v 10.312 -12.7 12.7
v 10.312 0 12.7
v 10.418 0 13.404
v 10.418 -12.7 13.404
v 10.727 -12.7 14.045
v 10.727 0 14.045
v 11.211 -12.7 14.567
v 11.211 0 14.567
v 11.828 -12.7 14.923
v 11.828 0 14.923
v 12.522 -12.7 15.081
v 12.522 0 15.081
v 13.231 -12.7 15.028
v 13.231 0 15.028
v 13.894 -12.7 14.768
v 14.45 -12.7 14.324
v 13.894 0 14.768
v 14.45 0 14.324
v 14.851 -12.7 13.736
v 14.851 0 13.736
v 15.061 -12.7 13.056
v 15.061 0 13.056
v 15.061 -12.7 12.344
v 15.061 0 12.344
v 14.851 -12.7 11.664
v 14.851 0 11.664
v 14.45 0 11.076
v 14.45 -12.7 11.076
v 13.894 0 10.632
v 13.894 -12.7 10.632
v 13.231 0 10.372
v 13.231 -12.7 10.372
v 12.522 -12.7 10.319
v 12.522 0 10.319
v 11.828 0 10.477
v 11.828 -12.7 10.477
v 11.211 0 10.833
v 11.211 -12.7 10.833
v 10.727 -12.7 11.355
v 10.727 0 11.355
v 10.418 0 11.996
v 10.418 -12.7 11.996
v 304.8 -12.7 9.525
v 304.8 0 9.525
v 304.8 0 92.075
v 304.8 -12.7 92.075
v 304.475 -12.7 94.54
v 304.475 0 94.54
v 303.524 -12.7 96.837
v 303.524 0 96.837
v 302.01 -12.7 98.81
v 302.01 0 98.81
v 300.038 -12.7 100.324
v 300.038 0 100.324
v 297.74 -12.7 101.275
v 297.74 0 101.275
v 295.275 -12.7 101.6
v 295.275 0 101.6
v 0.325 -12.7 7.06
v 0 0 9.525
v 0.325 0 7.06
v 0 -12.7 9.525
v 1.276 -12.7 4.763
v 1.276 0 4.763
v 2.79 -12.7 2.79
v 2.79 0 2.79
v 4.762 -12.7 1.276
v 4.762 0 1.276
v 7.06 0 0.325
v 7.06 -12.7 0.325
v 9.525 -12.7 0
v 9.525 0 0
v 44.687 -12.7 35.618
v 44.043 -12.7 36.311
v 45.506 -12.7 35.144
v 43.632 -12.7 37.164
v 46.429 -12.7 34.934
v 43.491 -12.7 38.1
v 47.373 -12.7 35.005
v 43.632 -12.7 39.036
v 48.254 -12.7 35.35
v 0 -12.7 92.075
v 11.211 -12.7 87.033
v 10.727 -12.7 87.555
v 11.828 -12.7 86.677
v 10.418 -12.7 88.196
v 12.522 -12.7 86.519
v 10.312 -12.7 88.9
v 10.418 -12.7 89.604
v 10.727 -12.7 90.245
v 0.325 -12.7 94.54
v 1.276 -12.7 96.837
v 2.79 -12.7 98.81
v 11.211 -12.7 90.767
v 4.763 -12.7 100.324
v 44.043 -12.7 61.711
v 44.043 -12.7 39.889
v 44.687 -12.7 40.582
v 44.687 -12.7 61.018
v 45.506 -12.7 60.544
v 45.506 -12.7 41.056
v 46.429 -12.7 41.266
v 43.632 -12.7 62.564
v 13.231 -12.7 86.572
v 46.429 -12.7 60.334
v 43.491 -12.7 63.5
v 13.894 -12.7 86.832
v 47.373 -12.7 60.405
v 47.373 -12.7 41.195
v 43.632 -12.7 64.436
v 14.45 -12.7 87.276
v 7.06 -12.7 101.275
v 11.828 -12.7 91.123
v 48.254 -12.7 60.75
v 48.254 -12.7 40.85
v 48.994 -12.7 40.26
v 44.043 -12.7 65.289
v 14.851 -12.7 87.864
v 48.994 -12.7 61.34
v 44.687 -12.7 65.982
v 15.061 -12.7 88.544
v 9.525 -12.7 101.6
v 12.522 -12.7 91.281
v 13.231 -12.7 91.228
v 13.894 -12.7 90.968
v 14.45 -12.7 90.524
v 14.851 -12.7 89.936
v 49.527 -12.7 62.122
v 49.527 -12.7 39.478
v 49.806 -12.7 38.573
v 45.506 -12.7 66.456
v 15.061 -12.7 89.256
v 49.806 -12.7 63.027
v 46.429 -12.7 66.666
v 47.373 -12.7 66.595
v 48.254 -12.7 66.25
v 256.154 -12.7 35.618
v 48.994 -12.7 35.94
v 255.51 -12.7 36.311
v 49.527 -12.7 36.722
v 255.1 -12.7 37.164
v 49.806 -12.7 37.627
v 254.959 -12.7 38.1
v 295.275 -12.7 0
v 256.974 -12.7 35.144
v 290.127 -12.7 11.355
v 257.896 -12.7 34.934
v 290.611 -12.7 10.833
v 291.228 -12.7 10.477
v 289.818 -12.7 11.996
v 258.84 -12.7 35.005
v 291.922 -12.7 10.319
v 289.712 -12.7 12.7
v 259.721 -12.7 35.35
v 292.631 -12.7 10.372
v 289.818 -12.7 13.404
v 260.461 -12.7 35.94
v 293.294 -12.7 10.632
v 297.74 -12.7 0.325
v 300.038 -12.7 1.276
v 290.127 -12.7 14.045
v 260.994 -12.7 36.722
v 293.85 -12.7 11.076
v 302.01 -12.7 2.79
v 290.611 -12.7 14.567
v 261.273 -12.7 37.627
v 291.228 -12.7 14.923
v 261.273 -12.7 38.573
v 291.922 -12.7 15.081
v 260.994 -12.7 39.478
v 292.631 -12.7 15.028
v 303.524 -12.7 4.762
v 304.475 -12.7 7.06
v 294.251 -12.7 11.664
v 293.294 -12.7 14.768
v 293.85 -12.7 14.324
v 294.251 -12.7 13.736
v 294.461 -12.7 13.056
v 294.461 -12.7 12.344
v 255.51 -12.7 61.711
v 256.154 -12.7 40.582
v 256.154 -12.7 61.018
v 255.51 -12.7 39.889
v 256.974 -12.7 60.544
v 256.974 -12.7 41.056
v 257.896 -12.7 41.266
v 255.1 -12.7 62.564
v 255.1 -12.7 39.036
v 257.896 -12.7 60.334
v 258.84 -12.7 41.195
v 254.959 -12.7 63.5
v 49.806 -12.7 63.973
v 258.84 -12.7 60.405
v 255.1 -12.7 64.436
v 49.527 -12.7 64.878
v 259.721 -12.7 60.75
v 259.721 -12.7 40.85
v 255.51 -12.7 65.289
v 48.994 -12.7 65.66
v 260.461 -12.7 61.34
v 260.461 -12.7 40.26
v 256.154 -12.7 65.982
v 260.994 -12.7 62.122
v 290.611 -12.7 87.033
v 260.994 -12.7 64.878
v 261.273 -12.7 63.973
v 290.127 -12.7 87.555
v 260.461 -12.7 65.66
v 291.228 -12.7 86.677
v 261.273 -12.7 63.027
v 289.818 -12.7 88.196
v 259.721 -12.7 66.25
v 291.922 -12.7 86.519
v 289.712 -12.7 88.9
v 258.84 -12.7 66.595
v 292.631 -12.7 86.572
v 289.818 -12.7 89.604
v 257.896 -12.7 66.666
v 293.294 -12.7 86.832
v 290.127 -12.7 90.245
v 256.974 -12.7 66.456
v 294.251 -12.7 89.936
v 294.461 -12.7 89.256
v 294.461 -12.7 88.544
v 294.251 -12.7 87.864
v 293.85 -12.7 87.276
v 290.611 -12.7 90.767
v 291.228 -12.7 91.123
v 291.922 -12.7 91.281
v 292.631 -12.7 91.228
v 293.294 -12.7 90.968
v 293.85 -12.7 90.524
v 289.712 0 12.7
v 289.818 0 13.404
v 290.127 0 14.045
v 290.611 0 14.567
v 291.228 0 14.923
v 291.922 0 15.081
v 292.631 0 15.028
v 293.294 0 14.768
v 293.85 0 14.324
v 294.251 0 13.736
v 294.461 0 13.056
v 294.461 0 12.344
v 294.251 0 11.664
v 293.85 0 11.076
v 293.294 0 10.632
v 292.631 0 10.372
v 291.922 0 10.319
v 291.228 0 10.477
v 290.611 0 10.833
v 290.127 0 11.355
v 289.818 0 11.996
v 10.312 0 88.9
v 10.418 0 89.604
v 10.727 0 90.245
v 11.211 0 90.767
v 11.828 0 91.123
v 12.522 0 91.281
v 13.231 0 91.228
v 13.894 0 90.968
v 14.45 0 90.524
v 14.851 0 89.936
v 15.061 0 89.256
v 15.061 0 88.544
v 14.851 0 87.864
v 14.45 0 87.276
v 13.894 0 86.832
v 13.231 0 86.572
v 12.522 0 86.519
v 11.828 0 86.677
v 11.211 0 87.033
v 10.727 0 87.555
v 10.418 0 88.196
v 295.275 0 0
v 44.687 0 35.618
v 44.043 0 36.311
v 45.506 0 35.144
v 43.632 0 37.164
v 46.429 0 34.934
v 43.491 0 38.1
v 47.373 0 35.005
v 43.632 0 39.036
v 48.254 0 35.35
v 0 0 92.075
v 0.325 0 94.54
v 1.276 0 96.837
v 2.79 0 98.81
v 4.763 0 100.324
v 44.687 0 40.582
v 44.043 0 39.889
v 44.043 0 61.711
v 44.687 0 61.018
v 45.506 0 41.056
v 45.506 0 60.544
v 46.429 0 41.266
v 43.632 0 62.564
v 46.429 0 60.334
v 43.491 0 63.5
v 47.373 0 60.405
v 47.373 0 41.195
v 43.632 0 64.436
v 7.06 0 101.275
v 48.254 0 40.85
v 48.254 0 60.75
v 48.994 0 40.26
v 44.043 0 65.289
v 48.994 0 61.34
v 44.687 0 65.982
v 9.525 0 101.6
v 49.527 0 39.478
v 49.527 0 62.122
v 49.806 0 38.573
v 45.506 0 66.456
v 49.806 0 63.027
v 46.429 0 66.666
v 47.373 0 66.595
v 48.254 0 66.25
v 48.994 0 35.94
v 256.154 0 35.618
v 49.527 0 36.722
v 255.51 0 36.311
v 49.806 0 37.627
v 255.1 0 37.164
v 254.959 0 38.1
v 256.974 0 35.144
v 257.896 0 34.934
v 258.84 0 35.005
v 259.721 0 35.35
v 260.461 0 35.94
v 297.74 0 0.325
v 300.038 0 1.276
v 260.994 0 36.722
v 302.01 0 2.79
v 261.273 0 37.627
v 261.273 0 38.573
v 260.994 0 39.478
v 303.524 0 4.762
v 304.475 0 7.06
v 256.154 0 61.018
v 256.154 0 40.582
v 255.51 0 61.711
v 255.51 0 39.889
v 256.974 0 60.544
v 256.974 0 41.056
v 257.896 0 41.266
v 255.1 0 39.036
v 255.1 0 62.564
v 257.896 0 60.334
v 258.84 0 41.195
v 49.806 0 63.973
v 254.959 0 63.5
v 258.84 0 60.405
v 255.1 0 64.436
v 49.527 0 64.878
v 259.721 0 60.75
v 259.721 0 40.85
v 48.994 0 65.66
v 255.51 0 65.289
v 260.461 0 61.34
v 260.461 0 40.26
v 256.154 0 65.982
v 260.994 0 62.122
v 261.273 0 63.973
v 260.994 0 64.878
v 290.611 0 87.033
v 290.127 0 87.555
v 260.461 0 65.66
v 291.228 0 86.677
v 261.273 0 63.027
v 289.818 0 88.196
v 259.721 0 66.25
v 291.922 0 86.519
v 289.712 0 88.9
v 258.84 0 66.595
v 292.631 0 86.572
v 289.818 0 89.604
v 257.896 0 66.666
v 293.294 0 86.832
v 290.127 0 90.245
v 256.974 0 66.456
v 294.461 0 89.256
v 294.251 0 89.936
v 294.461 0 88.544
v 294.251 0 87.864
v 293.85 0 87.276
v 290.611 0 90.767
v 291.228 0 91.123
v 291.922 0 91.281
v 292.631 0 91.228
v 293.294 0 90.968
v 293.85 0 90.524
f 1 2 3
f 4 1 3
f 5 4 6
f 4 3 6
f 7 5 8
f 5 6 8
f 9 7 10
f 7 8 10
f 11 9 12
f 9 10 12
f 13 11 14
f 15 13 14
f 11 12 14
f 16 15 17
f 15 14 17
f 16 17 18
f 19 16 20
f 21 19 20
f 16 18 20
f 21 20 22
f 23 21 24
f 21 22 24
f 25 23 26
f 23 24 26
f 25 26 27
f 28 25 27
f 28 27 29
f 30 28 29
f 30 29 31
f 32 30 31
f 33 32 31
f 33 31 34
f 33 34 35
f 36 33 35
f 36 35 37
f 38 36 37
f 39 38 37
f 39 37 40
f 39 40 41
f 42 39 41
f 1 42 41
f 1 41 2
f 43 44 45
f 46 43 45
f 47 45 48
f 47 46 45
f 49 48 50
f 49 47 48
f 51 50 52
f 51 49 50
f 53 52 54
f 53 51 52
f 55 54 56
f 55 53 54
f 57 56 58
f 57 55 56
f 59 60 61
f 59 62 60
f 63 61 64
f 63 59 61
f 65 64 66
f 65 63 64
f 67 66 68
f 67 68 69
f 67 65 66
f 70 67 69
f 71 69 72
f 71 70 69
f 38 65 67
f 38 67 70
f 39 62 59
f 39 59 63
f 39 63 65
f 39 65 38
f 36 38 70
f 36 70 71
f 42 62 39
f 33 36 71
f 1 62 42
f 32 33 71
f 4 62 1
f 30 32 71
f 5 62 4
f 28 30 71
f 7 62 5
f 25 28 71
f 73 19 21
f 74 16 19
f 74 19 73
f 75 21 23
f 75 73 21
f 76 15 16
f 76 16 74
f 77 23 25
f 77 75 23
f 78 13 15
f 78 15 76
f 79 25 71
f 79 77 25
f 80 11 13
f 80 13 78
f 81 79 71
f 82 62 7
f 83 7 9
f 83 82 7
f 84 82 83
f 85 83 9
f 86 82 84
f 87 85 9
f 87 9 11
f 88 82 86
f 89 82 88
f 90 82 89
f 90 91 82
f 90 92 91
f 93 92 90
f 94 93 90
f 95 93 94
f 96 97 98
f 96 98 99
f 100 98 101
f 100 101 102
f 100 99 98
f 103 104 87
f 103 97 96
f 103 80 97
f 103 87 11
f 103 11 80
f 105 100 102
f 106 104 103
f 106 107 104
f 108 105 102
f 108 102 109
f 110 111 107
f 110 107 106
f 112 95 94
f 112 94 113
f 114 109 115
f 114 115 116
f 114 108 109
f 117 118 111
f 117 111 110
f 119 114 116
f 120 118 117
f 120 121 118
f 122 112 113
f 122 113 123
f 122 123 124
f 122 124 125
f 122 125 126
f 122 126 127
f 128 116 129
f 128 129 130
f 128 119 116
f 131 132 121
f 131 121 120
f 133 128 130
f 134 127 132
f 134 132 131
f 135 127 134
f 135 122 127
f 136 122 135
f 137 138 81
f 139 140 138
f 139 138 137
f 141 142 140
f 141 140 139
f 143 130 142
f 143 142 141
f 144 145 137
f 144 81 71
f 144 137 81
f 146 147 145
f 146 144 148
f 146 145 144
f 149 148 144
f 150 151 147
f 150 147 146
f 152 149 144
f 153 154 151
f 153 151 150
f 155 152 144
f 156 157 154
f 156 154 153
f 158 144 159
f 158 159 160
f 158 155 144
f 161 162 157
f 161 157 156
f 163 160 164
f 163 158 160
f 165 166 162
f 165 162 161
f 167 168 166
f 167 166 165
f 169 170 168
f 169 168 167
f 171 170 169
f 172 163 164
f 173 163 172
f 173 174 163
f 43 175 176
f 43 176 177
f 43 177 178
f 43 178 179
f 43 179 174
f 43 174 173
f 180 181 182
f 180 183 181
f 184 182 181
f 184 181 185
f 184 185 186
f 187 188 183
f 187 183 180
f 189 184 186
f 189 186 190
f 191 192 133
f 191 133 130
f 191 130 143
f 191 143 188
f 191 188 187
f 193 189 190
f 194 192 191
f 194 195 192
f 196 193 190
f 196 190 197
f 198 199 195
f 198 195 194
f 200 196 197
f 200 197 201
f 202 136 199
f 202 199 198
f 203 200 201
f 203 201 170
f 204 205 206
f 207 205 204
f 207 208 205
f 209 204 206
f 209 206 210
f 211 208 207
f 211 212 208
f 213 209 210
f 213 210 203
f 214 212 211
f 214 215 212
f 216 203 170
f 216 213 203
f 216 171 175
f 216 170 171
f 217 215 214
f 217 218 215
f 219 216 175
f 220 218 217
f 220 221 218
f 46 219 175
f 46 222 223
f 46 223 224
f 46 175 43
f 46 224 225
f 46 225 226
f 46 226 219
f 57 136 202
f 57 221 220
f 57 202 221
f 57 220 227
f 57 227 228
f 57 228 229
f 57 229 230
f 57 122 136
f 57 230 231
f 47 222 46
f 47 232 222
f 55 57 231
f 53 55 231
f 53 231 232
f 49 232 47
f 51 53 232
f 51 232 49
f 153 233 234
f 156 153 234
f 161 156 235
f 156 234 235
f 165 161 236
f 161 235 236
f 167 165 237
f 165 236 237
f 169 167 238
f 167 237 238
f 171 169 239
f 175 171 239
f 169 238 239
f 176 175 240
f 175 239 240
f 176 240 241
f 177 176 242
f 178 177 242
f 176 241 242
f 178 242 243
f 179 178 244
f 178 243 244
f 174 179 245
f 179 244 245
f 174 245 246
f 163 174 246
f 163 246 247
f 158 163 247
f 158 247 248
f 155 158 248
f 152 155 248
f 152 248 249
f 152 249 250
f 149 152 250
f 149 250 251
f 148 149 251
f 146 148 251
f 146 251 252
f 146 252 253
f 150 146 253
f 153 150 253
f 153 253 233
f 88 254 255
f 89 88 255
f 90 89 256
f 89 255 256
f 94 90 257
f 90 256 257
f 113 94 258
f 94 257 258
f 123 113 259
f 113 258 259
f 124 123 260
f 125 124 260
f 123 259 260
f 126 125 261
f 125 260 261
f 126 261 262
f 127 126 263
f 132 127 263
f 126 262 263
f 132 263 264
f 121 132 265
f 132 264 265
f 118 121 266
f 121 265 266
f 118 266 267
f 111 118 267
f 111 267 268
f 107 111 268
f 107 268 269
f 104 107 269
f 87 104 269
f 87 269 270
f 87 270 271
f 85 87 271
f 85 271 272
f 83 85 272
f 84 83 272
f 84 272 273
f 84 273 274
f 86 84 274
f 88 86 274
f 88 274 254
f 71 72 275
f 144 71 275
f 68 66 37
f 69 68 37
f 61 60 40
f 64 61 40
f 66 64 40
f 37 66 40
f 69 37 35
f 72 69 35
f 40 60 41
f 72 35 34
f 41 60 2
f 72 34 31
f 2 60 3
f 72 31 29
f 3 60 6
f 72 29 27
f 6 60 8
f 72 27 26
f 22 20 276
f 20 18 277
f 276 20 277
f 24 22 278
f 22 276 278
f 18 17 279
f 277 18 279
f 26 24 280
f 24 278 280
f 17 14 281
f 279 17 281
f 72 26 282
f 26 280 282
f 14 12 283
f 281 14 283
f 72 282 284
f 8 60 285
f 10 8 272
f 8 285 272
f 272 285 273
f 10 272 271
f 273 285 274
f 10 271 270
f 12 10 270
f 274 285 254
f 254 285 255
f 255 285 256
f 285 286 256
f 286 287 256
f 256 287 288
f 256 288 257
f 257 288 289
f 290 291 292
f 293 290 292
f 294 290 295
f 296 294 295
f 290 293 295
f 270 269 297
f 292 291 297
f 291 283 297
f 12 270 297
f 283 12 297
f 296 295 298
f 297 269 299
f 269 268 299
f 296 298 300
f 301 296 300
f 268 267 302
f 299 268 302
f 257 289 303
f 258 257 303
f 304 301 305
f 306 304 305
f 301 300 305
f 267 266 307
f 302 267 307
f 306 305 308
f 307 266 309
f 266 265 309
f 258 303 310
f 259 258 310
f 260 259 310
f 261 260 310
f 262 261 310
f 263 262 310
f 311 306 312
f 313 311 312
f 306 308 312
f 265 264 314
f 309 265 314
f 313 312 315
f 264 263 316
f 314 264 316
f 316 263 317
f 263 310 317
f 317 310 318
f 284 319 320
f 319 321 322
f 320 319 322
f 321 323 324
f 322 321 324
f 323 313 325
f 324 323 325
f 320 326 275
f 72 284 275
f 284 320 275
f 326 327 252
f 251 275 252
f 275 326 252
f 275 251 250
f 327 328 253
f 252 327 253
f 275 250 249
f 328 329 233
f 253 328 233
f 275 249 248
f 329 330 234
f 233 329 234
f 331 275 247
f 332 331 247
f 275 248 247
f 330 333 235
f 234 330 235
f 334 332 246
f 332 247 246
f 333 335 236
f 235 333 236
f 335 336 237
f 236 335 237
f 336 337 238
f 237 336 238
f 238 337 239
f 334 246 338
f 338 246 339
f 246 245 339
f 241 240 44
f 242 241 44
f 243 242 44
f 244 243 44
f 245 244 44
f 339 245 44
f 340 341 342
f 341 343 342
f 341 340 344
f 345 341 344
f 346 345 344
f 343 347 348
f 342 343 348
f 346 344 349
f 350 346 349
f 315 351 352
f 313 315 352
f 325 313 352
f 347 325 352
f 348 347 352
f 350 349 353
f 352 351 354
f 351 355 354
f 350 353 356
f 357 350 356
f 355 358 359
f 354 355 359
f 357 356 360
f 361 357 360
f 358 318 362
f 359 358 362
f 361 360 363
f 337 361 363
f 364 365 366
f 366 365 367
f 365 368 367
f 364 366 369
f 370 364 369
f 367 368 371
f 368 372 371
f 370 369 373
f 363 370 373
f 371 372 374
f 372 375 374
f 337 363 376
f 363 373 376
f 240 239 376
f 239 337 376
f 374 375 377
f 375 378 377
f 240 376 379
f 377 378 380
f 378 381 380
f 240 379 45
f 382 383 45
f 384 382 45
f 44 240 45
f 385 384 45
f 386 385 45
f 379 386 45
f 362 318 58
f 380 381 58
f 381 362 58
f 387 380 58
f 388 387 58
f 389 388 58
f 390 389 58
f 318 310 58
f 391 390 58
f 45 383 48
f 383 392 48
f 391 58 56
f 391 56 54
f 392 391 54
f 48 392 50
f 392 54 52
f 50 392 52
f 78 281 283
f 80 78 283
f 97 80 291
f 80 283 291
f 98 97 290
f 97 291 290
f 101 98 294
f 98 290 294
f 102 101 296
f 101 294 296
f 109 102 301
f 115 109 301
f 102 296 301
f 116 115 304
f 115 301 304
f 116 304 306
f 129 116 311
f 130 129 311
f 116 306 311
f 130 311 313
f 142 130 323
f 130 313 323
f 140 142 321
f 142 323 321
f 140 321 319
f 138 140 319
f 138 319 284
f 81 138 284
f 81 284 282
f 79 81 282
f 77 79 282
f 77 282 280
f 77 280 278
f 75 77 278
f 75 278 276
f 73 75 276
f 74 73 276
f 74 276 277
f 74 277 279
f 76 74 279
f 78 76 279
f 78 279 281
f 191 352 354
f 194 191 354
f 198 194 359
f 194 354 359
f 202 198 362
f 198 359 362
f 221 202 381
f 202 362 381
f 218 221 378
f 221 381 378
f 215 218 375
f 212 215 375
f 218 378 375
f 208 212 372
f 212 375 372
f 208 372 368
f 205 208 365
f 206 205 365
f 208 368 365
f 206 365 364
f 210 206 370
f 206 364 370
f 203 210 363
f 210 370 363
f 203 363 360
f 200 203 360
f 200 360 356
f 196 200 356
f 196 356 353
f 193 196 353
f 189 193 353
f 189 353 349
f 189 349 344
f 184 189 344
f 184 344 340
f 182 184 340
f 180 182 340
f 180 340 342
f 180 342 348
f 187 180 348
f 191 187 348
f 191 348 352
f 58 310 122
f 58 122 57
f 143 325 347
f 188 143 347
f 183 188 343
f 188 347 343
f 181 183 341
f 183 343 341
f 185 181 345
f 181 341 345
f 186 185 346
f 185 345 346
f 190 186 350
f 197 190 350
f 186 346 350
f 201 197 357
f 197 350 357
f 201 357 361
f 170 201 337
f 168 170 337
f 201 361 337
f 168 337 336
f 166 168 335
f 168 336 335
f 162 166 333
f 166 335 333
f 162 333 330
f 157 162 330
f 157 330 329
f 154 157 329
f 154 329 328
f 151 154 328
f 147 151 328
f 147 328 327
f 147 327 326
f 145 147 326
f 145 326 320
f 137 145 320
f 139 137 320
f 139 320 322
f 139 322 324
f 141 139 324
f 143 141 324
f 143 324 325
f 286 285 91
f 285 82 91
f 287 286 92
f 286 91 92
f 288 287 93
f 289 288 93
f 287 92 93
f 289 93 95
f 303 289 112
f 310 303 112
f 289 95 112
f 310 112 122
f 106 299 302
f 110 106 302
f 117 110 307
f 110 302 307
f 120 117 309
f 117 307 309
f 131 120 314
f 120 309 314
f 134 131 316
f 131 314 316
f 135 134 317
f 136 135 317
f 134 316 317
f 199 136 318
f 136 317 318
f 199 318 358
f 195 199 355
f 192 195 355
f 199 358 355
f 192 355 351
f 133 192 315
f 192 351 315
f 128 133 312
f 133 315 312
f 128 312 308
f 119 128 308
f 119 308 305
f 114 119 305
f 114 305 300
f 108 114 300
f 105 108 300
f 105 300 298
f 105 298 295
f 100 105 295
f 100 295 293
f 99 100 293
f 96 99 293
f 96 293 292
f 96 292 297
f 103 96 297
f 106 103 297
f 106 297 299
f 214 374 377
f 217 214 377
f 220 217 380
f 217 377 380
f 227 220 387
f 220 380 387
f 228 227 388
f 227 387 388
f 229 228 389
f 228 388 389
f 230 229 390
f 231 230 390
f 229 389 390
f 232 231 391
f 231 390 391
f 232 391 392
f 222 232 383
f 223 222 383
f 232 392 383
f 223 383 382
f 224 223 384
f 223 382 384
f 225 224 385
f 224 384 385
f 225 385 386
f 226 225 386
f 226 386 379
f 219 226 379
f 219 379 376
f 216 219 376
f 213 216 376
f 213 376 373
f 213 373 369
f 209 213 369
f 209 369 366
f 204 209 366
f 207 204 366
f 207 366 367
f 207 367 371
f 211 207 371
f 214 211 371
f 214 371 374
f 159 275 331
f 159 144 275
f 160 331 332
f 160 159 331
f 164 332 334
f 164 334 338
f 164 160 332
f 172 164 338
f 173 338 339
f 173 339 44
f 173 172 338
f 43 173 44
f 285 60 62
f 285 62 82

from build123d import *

# Parameters (mm, degrees)
F0_W     = 304.8
F0_H     = 101.6
F1_DEPTH = 12.7
F2_R     = 9.525
F4_D     = 4.7752
F6_D     = 6.35


with BuildPart() as f1:
    # F0 (on Front) → F1 (new body)
    with BuildSketch(Plane.XZ):
        with Locations((152.4, 50.8)):
            Rectangle(F0_W, F0_H)
    extrude(amount=F1_DEPTH)

    # F2
    f2_edges = [f1.edges().sort_by_distance(p)[0] for p in [
        (0, -6.35, 101.6),
        (304.8, -6.35, 101.6),
        (304.8, -6.35, 0),
        (0, -6.35, 0),
    ]]
    fillet(f2_edges, radius=F2_R)

    # F4 (through all)
    with Locations(Plane.XZ.offset(12.7)):
        with Locations((12.7, 88.9), (12.7, 12.7), (292.1, 12.7), (292.1, 88.9)):
            Hole(F4_D / 2)

    # F6 (through all)
    with Locations(Plane.XZ.offset(12.7)):
        with Locations((46.666421, 63.5), (46.666421, 38.1), (258.133579, 63.5), (258.133579, 38.1)):
            Hole(F6_D / 2)


solid = f1.part
